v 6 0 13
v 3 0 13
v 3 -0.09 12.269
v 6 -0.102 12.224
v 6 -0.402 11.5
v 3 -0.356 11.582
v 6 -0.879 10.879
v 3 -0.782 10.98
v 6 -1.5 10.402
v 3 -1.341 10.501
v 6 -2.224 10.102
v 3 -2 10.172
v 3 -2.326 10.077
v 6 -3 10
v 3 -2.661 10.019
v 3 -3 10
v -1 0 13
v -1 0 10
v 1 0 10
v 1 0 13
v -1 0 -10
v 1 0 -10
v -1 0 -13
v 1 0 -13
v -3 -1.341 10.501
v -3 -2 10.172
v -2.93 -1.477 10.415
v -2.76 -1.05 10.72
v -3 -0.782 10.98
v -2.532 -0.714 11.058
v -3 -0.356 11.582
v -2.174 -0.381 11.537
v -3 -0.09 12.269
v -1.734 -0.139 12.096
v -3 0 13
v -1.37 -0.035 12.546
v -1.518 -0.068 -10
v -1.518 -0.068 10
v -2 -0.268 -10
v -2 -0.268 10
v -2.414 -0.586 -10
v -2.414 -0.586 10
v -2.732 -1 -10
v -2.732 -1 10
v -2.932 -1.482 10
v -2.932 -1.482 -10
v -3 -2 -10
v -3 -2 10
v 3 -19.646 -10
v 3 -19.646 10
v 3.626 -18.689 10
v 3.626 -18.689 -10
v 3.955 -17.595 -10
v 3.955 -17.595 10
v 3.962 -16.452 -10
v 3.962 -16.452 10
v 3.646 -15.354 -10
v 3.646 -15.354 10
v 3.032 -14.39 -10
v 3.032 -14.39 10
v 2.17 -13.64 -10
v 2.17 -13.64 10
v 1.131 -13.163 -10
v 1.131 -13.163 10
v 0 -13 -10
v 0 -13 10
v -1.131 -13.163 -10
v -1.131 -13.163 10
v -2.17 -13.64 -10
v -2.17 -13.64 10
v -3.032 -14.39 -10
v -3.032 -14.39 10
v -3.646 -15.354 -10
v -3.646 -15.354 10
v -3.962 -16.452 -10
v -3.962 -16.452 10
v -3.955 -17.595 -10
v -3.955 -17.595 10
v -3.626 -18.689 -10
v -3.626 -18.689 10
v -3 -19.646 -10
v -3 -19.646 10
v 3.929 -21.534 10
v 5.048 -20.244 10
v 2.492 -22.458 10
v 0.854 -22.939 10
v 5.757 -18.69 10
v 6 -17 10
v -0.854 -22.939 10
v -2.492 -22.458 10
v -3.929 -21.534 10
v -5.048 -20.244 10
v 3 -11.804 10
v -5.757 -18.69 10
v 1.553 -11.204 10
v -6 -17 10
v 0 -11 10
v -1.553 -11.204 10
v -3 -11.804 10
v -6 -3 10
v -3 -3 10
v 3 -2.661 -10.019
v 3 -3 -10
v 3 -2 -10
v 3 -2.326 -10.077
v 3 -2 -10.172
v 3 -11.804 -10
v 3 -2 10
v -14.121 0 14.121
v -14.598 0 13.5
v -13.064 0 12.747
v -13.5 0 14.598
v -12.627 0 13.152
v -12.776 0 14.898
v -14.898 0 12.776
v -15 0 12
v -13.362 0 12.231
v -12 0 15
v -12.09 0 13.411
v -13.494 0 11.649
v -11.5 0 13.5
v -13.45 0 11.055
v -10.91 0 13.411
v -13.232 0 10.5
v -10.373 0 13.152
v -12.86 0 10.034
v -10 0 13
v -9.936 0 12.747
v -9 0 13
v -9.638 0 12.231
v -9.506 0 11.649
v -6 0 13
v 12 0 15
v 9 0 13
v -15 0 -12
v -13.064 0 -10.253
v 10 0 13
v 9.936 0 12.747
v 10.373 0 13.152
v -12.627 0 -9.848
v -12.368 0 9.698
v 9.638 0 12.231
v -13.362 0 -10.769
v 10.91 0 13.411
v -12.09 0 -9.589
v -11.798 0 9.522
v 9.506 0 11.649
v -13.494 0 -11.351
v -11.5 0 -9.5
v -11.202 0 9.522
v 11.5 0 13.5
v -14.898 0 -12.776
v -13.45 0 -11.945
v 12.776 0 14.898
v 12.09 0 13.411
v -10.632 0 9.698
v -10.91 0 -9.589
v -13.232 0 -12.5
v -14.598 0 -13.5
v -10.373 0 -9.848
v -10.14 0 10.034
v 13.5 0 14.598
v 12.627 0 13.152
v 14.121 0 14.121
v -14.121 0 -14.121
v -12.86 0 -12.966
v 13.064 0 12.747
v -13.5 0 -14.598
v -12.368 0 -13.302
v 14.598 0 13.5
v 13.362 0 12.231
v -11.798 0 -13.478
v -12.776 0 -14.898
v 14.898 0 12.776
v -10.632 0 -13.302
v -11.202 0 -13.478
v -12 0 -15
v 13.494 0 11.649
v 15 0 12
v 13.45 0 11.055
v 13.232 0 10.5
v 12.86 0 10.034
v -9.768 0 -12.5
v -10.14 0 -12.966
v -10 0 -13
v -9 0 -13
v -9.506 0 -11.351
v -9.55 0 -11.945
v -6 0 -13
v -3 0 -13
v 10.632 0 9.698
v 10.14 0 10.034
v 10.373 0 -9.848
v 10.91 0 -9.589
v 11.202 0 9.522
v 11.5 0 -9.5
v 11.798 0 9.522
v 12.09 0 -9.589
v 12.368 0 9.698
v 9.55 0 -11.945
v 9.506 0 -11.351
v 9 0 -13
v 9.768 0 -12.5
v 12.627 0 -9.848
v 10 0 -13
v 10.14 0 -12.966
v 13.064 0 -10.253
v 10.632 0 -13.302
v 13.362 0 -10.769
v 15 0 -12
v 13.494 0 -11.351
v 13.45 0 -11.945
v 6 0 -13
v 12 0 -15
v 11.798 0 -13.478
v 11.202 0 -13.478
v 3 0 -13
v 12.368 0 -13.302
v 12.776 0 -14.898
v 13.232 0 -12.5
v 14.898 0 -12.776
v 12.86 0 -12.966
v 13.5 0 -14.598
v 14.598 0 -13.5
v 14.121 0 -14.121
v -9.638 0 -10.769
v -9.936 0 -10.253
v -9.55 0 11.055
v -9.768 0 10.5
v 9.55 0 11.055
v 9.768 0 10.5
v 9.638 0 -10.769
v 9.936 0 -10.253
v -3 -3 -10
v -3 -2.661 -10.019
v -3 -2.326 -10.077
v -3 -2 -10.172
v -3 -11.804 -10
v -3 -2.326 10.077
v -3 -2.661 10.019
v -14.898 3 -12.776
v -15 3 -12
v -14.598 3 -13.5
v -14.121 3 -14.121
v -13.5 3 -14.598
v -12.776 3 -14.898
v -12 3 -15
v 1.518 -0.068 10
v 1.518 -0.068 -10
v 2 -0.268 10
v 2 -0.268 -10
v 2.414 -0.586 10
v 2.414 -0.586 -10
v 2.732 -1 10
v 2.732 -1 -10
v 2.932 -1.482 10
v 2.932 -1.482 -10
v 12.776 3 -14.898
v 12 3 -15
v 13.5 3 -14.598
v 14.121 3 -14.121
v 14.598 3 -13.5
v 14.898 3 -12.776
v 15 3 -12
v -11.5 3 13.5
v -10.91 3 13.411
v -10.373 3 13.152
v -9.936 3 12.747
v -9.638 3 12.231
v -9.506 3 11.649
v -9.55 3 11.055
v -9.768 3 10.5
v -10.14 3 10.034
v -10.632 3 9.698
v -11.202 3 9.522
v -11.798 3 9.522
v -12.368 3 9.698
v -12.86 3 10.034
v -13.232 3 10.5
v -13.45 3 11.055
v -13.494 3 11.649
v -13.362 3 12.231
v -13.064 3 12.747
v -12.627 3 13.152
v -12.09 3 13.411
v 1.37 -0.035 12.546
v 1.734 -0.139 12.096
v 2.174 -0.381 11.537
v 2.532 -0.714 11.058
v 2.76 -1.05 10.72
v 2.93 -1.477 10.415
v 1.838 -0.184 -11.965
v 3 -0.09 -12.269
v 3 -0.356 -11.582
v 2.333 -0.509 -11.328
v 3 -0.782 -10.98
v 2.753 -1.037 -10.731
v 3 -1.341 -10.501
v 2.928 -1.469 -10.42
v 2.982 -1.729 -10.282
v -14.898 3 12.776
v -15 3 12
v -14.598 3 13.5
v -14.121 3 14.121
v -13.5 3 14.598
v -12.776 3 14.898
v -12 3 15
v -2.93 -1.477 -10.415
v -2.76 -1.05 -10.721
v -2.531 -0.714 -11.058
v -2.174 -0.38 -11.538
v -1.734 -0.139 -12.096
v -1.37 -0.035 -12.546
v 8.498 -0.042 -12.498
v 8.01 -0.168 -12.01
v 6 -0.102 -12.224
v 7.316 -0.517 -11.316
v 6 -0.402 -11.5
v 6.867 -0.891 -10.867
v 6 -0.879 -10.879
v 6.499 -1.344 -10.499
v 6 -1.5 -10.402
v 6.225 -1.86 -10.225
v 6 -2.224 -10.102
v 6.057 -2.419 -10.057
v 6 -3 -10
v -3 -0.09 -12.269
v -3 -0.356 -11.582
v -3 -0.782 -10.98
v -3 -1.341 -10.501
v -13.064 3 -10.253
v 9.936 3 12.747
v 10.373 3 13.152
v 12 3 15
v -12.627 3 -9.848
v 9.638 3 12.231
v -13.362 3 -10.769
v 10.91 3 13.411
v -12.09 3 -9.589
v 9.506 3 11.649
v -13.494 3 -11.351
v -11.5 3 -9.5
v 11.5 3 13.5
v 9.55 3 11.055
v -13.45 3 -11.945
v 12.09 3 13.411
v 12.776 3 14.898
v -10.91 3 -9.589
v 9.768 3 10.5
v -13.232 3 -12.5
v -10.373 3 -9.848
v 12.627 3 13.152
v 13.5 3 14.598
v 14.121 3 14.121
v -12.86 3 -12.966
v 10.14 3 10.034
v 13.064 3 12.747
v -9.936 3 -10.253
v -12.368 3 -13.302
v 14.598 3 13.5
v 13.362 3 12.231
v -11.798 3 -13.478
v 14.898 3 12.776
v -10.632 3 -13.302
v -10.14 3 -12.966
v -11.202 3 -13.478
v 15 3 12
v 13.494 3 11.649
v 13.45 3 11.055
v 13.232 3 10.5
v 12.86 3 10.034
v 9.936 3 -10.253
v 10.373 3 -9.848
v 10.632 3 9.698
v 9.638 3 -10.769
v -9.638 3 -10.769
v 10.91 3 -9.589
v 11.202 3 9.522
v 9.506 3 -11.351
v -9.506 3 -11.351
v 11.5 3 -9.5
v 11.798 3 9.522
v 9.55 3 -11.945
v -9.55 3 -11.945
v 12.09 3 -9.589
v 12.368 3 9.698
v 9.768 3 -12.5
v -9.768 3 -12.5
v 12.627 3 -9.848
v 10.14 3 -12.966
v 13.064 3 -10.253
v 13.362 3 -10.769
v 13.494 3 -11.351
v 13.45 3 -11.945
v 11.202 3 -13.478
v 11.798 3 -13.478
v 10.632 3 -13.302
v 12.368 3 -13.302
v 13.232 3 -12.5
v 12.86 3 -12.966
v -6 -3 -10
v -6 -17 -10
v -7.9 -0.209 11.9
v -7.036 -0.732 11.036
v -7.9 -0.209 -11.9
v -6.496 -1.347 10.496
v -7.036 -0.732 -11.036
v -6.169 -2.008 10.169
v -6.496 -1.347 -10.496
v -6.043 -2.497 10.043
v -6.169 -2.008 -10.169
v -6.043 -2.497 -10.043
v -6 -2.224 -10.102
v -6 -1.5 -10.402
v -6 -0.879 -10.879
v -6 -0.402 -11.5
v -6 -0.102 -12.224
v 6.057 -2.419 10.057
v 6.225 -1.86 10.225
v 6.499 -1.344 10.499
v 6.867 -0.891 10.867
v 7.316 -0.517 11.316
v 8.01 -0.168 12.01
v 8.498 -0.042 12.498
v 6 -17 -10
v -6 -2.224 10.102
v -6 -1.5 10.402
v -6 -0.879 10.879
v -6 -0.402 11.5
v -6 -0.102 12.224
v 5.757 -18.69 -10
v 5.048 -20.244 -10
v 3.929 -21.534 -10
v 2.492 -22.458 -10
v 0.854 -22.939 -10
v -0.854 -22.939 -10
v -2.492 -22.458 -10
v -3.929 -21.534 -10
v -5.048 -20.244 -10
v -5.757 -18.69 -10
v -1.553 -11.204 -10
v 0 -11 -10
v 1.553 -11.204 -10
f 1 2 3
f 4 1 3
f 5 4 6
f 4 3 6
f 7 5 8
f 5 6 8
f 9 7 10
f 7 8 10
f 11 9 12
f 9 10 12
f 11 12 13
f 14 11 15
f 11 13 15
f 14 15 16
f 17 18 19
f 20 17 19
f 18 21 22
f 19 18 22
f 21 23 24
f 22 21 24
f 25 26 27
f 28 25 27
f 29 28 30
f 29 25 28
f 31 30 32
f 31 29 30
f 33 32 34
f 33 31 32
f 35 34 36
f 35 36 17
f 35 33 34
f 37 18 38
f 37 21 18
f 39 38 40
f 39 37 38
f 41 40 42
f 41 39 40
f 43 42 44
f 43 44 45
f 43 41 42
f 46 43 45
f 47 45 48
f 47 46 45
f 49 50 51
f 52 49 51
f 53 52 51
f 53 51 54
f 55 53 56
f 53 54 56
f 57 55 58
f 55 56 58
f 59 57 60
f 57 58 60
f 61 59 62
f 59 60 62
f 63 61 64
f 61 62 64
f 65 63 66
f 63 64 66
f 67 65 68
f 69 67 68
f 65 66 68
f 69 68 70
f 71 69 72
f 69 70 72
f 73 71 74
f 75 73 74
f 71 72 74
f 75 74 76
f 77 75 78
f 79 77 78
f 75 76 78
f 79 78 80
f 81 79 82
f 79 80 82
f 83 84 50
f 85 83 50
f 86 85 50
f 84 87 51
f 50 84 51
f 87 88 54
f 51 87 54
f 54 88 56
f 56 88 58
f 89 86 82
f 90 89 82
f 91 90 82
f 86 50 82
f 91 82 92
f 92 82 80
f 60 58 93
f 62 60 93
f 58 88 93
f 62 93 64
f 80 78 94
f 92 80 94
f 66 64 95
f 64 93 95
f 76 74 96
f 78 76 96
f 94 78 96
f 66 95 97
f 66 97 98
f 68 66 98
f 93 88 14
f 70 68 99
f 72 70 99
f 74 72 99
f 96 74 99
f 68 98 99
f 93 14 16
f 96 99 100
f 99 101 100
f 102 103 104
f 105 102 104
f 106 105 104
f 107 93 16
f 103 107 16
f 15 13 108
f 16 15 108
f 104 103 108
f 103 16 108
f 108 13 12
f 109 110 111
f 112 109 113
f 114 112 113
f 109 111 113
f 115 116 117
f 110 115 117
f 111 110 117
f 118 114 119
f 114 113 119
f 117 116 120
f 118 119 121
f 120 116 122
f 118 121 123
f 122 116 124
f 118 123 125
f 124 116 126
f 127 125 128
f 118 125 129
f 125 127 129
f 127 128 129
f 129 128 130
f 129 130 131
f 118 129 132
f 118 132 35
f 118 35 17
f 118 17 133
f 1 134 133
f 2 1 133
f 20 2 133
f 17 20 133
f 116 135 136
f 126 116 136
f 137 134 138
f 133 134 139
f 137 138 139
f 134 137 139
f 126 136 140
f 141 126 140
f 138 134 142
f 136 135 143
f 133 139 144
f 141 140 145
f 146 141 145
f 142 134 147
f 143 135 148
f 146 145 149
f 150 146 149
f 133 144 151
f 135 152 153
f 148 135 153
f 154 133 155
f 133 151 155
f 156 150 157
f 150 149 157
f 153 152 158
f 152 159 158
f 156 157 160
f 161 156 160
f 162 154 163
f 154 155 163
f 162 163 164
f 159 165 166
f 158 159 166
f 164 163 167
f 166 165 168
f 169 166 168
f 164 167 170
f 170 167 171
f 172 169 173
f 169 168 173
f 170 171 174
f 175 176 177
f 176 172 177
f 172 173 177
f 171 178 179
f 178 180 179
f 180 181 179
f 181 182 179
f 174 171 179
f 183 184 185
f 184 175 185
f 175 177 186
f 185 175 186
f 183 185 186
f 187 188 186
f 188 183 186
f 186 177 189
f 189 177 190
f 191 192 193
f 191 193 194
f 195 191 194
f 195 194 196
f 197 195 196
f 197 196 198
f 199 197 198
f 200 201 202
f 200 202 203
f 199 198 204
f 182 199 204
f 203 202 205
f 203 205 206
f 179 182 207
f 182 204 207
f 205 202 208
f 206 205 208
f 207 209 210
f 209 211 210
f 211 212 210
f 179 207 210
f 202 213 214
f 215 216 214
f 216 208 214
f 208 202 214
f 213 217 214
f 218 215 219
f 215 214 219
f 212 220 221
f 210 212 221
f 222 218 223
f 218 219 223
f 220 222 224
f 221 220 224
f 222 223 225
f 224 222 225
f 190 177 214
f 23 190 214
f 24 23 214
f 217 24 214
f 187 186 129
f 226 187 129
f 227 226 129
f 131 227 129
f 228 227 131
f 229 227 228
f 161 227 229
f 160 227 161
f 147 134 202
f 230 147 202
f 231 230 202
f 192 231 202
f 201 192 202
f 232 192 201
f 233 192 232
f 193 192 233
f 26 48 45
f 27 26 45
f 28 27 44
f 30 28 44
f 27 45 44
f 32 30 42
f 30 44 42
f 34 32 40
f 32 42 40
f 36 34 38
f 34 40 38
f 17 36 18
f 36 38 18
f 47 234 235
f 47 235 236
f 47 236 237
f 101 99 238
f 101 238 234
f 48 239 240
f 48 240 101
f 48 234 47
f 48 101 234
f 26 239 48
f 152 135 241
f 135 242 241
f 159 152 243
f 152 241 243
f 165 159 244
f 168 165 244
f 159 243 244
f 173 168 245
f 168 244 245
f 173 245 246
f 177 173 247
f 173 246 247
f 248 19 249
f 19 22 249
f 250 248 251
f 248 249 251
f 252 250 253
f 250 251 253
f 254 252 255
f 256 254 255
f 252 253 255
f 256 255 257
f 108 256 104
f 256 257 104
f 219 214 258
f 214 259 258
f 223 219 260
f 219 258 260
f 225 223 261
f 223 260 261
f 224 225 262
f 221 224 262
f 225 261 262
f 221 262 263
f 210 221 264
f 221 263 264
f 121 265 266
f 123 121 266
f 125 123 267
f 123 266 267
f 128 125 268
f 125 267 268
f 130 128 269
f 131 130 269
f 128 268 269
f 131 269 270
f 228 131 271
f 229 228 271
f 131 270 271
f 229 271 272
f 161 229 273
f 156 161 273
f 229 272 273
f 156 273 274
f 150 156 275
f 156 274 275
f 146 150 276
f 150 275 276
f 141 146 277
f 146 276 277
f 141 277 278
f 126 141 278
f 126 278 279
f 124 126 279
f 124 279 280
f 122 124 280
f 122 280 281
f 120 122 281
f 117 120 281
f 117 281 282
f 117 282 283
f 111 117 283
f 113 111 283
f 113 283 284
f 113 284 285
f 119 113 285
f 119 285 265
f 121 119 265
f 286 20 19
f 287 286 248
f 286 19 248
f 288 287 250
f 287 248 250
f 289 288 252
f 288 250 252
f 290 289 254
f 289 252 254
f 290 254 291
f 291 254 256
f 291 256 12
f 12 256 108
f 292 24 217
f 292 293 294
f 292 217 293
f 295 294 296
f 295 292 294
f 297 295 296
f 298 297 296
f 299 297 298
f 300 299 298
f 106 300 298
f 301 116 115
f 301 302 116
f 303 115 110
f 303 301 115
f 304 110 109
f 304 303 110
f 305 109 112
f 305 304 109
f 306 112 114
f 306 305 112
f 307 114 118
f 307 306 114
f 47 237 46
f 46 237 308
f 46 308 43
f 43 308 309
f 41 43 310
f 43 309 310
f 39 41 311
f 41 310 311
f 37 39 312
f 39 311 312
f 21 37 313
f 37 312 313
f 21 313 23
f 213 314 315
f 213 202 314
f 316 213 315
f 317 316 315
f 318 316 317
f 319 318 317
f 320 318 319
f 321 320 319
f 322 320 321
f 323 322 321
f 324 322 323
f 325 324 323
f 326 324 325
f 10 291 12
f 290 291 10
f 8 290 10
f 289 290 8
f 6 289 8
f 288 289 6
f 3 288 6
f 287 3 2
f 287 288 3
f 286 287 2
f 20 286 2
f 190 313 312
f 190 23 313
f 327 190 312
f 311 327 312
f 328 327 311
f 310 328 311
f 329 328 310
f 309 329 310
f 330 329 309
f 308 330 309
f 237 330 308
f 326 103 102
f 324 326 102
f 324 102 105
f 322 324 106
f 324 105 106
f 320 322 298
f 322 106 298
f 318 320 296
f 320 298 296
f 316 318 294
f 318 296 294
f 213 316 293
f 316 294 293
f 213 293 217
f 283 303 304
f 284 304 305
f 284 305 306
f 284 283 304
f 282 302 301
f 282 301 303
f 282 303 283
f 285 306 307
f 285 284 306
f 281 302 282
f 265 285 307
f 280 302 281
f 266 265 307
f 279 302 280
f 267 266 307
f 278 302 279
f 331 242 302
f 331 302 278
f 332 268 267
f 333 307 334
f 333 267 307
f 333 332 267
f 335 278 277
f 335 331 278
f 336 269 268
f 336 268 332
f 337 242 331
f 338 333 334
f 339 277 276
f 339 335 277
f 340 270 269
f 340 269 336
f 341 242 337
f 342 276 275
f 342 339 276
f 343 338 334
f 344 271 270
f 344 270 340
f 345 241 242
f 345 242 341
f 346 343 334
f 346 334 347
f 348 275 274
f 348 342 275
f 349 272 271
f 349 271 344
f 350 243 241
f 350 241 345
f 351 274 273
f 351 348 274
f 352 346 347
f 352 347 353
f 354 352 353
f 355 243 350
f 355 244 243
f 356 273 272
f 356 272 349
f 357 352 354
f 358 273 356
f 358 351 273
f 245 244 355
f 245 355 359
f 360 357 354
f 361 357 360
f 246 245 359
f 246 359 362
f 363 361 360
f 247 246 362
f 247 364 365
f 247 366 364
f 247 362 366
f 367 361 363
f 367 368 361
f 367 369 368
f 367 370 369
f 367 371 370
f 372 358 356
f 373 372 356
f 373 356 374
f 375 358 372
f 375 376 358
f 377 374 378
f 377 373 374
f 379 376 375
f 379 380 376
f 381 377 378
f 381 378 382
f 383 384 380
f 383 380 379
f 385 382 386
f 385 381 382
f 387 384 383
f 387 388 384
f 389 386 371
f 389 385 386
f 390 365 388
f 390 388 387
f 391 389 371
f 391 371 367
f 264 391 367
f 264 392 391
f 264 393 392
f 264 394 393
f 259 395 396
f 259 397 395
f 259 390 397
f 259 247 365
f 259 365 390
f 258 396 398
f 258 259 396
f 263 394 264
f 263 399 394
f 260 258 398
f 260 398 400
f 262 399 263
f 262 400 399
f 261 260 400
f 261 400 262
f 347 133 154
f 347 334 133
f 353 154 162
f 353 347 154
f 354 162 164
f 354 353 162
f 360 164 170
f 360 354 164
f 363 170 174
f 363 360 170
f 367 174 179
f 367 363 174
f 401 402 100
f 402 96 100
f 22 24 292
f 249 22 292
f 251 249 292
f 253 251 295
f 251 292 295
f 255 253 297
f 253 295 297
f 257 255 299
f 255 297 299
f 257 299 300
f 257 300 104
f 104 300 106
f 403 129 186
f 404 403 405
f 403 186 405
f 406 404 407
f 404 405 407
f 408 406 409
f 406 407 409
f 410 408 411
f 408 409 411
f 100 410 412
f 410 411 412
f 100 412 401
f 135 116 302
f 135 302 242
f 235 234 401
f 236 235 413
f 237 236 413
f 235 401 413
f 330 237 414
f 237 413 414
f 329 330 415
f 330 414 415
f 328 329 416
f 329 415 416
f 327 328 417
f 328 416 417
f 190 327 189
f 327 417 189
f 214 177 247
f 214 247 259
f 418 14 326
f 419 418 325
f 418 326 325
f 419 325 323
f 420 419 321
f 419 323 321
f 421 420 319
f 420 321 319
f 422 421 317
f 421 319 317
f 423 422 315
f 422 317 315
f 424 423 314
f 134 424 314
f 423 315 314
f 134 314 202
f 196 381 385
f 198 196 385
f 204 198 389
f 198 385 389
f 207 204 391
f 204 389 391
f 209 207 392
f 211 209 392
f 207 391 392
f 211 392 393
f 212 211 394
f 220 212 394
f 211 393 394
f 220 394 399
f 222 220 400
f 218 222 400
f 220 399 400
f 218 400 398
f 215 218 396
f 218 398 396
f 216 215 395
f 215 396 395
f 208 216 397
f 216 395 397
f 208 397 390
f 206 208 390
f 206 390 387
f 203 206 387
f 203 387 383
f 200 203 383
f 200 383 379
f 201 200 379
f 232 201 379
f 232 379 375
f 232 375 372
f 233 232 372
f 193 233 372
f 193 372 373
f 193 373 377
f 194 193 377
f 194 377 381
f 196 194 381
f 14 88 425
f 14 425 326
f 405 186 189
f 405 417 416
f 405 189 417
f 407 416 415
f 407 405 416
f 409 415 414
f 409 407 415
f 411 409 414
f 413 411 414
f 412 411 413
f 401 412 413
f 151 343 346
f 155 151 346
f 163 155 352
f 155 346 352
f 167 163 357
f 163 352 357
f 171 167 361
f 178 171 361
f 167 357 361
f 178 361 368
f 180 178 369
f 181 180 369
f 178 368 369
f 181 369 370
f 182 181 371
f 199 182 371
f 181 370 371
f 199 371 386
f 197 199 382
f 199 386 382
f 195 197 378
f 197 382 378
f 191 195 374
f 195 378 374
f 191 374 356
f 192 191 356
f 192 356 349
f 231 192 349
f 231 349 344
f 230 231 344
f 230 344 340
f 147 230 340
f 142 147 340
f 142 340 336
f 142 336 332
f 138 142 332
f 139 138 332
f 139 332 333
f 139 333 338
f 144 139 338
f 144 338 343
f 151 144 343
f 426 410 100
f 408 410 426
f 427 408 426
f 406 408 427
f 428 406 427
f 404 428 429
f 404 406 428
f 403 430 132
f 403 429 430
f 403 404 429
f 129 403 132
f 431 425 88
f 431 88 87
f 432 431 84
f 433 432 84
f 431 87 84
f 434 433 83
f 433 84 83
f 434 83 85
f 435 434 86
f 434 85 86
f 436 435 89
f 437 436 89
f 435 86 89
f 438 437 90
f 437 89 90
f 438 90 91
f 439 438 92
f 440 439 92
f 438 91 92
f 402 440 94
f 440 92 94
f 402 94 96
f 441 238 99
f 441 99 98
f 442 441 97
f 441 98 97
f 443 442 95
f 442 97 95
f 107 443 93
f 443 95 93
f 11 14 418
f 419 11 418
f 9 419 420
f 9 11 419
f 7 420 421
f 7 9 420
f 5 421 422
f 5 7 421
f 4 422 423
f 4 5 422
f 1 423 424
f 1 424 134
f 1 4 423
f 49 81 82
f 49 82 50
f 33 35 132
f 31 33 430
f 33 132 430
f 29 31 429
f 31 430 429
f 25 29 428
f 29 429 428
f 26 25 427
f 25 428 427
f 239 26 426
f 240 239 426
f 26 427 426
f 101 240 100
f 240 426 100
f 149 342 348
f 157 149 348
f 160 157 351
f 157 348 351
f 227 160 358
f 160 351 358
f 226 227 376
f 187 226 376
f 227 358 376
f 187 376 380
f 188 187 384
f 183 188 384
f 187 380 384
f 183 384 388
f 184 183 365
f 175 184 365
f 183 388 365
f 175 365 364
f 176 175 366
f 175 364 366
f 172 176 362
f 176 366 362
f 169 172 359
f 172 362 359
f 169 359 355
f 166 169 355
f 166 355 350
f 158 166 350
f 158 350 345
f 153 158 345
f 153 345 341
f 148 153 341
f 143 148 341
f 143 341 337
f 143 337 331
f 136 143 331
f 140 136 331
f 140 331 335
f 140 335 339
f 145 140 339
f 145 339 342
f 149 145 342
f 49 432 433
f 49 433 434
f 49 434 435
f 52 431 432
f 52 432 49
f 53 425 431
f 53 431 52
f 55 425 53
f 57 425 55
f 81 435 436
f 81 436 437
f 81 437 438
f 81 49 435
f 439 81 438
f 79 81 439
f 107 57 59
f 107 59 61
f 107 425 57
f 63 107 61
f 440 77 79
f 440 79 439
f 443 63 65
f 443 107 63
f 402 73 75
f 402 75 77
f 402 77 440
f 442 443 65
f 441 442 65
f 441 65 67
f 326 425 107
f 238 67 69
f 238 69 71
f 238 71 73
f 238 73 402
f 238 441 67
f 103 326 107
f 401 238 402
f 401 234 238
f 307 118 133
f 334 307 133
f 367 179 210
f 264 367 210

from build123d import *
from build123d.topology import SkipClean

# Parameters (mm, degrees)
CROQUIS1_W              = 30
CROQUIS1_H              = 30
SALIENTE_EXTRUIR1_DEPTH = 3
SALIENTE_EXTRUIR2_DEPTH = 20
CROQUIS4_R              = 2
CORTAR_EXTRUIR1_DEPTH   = 34.555923471
REDONDEO2_R             = 3
REDONDEO4_R             = 2
REDONDEO5_START         = -6
REDONDEO5_DEPTH         = 3
REDONDEO5_START_2       = 3
REDONDEO5_2_DEPTH       = 3
REDONDEO5_START_3       = -13.0000001
REDONDEO5_3_DEPTH       = 26.0000001
REDONDEO5_START_4       = -10
REDONDEO5_4_DEPTH       = 20


with BuildPart() as part:
    # Croquis1 → Saliente-Extruir1 (new body)
    with BuildSketch(Plane(origin=(0, 0, 0), x_dir=(1, 0, 0), z_dir=(0, 1, 0))):
        Rectangle(CROQUIS1_W, CROQUIS1_H)
    extrude(amount=SALIENTE_EXTRUIR1_DEPTH)

    # Croquis3 → Saliente-Extruir2 (add)
    with BuildSketch(Plane.XY.offset(10)):
        with BuildLine():
            Line((-3, 0), (-3, -11.803847577))
            ThreePointArc((-3, -11.803847577), (0, -11), (3, -11.803847577))
            Line((3, -11.803847577), (3, 0))
            Line((3, 0), (6, 0))
            Line((6, 0), (6, -17))
            ThreePointArc((6, -17), (0, -23), (-6, -17))
            Line((-6, -17), (-6, 0))
            Line((-6, 0), (-3, 0))
        make_face()
        with BuildLine():
            Line((-3, -19.645751311), (3, -19.645751311))
            ThreePointArc((3, -19.645751311), (0, -13), (-3, -19.645751311))
        make_face(mode=Mode.SUBTRACT)
    extrude(amount=-SALIENTE_EXTRUIR2_DEPTH)

    # Croquis4 → Cortar-Extruir1 (cut, through all)
    with BuildSketch(Plane(origin=(0, 3, 0), x_dir=(1, 0, 0), z_dir=(0, 1, 0))):
        with Locations(Location((-11.5, 11.5, 0), (0, 0, 270))):
            Circle(CROQUIS4_R)
        with Locations(Location((11.5, 11.5, 0), (0, 0, 270))):
            Circle(CROQUIS4_R)
        with Locations(Location((11.5, -11.5, 0), (0, 0, 270))):
            Circle(CROQUIS4_R)
        with Locations(Location((-11.5, -11.5, 0), (0, 0, 270))):
            Circle(CROQUIS4_R)
    extrude(amount=-CORTAR_EXTRUIR1_DEPTH, mode=Mode.SUBTRACT)

    # Redondeo2
    redondeo2_edges = [part.edges().sort_by_distance(p)[0] for p in [
        (-15, 1.5, -15),
        (15, 1.5, -15),
        (15, 1.5, 15),
        (-15, 1.5, 15),
    ]]
    fillet(redondeo2_edges, radius=REDONDEO2_R)

    # Redondeo4
    redondeo4_edges = [part.edges().sort_by_distance(p)[0] for p in [
        (-3, 0, 0),
        (3, 0, 0),
    ]]
    fillet(redondeo4_edges, radius=REDONDEO4_R)

    # Redondeo5: read off the stored shape, not the designer's step
    # Redondeo5 outline → Redondeo5 (add)
    with BuildSketch(Plane.YZ.offset(REDONDEO5_START)):
        with BuildLine():
            Line((0, -13), (0, -10))
            Line((0, -10), (-3, -10))
            ThreePointArc((-3, -10), (-0.878679656, -10.878679656), (0, -13))
        make_face()
        with BuildLine():
            ThreePointArc((0, 13), (-0.878679656, 10.878679656), (-3, 10))
            Line((-3, 10), (0, 10))
            Line((0, 10), (0, 13))
        make_face()
    extrude(amount=REDONDEO5_DEPTH)

    # Redondeo5 2 outline → Redondeo5 2 (add)
    with BuildSketch(Plane.YZ.offset(REDONDEO5_START_2)):
        with BuildLine():
            Line((0, -13), (0, -10))
            Line((0, -10), (-3, -10))
            ThreePointArc((-3, -10), (-0.878679656, -10.878679656), (0, -13))
        make_face()
        with BuildLine():
            ThreePointArc((0, 13), (-0.878679656, 10.878679656), (-3, 10))
            Line((-3, 10), (0, 10))
            Line((0, 10), (0, 13))
        make_face()
    extrude(amount=REDONDEO5_2_DEPTH)

    # Redondeo5 3 outline → Redondeo5 3 (add)
    with SkipClean():  # the faces are left unmerged after this step: merging them gives an invalid solid
        with BuildSketch(Plane.XY.offset(REDONDEO5_START_3)):
            with BuildLine():
                Line((-3, 0), (-3, -2))
                ThreePointArc((-3, -2), (-2.414213562, -0.585786438), (-1, 0))
                Line((-1, 0), (-3, 0))
            make_face()
            with BuildLine():
                Line((-6, -3), (-6, 0))
                Line((-6, 0), (-9, 0))
                ThreePointArc((-9, 0), (-6.878679656, -0.878679656), (-6, -3))
            make_face()
            with BuildLine():
                Line((9, 0), (6, 0))
                Line((6, 0), (6, -3))
                ThreePointArc((6, -3), (6.878679656, -0.878679656), (9, 0))
            make_face()
            with BuildLine():
                Line((3, 0), (1, 0))
                ThreePointArc((1, 0), (2.414213562, -0.585786438), (3, -2))
                Line((3, -2), (3, 0))
            make_face()
        extrude(amount=REDONDEO5_3_DEPTH)

    # Redondeo5 4 outline → Redondeo5 4 (cut)
    with SkipClean():  # the faces are left unmerged after this step: merging them gives an invalid solid
        with BuildSketch(Plane.YZ.offset(REDONDEO5_START_4)):
            with BuildLine():
                ThreePointArc((0, -13.00000005), (-0.878679638, -10.878679674), (-3, -10))
                Line((-3, -10), (-3, -13.0000001))
                Line((-3, -13.0000001), (0, -13.00000005))
            make_face()
            with BuildLine():
                Line((0, 13), (-3, 13))
                Line((-3, 13), (-3, 10))
                ThreePointArc((-3, 10), (-0.878679656, 10.878679656), (0, 13))
            make_face()
        extrude(amount=REDONDEO5_4_DEPTH, mode=Mode.SUBTRACT)


solid = part.part
